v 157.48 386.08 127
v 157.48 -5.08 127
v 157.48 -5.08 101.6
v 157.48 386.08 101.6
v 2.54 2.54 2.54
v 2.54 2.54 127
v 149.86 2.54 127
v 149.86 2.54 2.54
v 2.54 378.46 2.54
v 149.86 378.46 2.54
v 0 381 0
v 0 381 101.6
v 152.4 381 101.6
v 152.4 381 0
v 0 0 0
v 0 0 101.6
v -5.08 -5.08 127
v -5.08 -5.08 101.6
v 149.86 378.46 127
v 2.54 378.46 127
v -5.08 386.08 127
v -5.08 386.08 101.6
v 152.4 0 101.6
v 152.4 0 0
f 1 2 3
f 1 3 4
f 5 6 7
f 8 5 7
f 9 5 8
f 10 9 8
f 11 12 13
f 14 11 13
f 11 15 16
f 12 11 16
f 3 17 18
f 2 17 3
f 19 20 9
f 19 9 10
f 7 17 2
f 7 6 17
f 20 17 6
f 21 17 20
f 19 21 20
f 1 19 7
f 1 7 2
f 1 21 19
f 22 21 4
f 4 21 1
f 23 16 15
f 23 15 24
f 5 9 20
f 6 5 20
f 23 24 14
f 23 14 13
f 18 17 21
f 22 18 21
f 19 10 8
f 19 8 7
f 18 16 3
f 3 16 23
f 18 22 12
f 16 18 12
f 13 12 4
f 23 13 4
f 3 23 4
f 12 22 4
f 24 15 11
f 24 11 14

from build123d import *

# Parameters (mm, degrees)
F0_W     = 152.4
F0_H     = 127
F1_DEPTH = 381
F2_T     = -2.54
F3_W     = 162.56
F3_H     = 391.16
F3_W_2   = 152.4
F3_H_2   = 381
F4_DEPTH = 25.4


with BuildPart() as f1:
    # F0 (on Front) → F1 (new body)
    with BuildSketch(Plane.XZ):
        with Locations((76.2, 63.5)):
            Rectangle(F0_W, F0_H)
    extrude(amount=-F1_DEPTH)

    # F2
    f2_openings = [f1.faces().sort_by_distance(p)[0] for p in [
        (76.2, 190.5, 127),
    ]]
    offset(amount=F2_T, openings=f2_openings)

    # F3 (on face) → F4 (join)
    with BuildSketch(Plane.XY.offset(127)):
        with Locations((76.2, 190.5)):
            Rectangle(F3_W, F3_H)
        with Locations((76.2, 190.5)):
            Rectangle(F3_W_2, F3_H_2, mode=Mode.SUBTRACT)
    extrude(amount=-F4_DEPTH)


solid = f1.part
